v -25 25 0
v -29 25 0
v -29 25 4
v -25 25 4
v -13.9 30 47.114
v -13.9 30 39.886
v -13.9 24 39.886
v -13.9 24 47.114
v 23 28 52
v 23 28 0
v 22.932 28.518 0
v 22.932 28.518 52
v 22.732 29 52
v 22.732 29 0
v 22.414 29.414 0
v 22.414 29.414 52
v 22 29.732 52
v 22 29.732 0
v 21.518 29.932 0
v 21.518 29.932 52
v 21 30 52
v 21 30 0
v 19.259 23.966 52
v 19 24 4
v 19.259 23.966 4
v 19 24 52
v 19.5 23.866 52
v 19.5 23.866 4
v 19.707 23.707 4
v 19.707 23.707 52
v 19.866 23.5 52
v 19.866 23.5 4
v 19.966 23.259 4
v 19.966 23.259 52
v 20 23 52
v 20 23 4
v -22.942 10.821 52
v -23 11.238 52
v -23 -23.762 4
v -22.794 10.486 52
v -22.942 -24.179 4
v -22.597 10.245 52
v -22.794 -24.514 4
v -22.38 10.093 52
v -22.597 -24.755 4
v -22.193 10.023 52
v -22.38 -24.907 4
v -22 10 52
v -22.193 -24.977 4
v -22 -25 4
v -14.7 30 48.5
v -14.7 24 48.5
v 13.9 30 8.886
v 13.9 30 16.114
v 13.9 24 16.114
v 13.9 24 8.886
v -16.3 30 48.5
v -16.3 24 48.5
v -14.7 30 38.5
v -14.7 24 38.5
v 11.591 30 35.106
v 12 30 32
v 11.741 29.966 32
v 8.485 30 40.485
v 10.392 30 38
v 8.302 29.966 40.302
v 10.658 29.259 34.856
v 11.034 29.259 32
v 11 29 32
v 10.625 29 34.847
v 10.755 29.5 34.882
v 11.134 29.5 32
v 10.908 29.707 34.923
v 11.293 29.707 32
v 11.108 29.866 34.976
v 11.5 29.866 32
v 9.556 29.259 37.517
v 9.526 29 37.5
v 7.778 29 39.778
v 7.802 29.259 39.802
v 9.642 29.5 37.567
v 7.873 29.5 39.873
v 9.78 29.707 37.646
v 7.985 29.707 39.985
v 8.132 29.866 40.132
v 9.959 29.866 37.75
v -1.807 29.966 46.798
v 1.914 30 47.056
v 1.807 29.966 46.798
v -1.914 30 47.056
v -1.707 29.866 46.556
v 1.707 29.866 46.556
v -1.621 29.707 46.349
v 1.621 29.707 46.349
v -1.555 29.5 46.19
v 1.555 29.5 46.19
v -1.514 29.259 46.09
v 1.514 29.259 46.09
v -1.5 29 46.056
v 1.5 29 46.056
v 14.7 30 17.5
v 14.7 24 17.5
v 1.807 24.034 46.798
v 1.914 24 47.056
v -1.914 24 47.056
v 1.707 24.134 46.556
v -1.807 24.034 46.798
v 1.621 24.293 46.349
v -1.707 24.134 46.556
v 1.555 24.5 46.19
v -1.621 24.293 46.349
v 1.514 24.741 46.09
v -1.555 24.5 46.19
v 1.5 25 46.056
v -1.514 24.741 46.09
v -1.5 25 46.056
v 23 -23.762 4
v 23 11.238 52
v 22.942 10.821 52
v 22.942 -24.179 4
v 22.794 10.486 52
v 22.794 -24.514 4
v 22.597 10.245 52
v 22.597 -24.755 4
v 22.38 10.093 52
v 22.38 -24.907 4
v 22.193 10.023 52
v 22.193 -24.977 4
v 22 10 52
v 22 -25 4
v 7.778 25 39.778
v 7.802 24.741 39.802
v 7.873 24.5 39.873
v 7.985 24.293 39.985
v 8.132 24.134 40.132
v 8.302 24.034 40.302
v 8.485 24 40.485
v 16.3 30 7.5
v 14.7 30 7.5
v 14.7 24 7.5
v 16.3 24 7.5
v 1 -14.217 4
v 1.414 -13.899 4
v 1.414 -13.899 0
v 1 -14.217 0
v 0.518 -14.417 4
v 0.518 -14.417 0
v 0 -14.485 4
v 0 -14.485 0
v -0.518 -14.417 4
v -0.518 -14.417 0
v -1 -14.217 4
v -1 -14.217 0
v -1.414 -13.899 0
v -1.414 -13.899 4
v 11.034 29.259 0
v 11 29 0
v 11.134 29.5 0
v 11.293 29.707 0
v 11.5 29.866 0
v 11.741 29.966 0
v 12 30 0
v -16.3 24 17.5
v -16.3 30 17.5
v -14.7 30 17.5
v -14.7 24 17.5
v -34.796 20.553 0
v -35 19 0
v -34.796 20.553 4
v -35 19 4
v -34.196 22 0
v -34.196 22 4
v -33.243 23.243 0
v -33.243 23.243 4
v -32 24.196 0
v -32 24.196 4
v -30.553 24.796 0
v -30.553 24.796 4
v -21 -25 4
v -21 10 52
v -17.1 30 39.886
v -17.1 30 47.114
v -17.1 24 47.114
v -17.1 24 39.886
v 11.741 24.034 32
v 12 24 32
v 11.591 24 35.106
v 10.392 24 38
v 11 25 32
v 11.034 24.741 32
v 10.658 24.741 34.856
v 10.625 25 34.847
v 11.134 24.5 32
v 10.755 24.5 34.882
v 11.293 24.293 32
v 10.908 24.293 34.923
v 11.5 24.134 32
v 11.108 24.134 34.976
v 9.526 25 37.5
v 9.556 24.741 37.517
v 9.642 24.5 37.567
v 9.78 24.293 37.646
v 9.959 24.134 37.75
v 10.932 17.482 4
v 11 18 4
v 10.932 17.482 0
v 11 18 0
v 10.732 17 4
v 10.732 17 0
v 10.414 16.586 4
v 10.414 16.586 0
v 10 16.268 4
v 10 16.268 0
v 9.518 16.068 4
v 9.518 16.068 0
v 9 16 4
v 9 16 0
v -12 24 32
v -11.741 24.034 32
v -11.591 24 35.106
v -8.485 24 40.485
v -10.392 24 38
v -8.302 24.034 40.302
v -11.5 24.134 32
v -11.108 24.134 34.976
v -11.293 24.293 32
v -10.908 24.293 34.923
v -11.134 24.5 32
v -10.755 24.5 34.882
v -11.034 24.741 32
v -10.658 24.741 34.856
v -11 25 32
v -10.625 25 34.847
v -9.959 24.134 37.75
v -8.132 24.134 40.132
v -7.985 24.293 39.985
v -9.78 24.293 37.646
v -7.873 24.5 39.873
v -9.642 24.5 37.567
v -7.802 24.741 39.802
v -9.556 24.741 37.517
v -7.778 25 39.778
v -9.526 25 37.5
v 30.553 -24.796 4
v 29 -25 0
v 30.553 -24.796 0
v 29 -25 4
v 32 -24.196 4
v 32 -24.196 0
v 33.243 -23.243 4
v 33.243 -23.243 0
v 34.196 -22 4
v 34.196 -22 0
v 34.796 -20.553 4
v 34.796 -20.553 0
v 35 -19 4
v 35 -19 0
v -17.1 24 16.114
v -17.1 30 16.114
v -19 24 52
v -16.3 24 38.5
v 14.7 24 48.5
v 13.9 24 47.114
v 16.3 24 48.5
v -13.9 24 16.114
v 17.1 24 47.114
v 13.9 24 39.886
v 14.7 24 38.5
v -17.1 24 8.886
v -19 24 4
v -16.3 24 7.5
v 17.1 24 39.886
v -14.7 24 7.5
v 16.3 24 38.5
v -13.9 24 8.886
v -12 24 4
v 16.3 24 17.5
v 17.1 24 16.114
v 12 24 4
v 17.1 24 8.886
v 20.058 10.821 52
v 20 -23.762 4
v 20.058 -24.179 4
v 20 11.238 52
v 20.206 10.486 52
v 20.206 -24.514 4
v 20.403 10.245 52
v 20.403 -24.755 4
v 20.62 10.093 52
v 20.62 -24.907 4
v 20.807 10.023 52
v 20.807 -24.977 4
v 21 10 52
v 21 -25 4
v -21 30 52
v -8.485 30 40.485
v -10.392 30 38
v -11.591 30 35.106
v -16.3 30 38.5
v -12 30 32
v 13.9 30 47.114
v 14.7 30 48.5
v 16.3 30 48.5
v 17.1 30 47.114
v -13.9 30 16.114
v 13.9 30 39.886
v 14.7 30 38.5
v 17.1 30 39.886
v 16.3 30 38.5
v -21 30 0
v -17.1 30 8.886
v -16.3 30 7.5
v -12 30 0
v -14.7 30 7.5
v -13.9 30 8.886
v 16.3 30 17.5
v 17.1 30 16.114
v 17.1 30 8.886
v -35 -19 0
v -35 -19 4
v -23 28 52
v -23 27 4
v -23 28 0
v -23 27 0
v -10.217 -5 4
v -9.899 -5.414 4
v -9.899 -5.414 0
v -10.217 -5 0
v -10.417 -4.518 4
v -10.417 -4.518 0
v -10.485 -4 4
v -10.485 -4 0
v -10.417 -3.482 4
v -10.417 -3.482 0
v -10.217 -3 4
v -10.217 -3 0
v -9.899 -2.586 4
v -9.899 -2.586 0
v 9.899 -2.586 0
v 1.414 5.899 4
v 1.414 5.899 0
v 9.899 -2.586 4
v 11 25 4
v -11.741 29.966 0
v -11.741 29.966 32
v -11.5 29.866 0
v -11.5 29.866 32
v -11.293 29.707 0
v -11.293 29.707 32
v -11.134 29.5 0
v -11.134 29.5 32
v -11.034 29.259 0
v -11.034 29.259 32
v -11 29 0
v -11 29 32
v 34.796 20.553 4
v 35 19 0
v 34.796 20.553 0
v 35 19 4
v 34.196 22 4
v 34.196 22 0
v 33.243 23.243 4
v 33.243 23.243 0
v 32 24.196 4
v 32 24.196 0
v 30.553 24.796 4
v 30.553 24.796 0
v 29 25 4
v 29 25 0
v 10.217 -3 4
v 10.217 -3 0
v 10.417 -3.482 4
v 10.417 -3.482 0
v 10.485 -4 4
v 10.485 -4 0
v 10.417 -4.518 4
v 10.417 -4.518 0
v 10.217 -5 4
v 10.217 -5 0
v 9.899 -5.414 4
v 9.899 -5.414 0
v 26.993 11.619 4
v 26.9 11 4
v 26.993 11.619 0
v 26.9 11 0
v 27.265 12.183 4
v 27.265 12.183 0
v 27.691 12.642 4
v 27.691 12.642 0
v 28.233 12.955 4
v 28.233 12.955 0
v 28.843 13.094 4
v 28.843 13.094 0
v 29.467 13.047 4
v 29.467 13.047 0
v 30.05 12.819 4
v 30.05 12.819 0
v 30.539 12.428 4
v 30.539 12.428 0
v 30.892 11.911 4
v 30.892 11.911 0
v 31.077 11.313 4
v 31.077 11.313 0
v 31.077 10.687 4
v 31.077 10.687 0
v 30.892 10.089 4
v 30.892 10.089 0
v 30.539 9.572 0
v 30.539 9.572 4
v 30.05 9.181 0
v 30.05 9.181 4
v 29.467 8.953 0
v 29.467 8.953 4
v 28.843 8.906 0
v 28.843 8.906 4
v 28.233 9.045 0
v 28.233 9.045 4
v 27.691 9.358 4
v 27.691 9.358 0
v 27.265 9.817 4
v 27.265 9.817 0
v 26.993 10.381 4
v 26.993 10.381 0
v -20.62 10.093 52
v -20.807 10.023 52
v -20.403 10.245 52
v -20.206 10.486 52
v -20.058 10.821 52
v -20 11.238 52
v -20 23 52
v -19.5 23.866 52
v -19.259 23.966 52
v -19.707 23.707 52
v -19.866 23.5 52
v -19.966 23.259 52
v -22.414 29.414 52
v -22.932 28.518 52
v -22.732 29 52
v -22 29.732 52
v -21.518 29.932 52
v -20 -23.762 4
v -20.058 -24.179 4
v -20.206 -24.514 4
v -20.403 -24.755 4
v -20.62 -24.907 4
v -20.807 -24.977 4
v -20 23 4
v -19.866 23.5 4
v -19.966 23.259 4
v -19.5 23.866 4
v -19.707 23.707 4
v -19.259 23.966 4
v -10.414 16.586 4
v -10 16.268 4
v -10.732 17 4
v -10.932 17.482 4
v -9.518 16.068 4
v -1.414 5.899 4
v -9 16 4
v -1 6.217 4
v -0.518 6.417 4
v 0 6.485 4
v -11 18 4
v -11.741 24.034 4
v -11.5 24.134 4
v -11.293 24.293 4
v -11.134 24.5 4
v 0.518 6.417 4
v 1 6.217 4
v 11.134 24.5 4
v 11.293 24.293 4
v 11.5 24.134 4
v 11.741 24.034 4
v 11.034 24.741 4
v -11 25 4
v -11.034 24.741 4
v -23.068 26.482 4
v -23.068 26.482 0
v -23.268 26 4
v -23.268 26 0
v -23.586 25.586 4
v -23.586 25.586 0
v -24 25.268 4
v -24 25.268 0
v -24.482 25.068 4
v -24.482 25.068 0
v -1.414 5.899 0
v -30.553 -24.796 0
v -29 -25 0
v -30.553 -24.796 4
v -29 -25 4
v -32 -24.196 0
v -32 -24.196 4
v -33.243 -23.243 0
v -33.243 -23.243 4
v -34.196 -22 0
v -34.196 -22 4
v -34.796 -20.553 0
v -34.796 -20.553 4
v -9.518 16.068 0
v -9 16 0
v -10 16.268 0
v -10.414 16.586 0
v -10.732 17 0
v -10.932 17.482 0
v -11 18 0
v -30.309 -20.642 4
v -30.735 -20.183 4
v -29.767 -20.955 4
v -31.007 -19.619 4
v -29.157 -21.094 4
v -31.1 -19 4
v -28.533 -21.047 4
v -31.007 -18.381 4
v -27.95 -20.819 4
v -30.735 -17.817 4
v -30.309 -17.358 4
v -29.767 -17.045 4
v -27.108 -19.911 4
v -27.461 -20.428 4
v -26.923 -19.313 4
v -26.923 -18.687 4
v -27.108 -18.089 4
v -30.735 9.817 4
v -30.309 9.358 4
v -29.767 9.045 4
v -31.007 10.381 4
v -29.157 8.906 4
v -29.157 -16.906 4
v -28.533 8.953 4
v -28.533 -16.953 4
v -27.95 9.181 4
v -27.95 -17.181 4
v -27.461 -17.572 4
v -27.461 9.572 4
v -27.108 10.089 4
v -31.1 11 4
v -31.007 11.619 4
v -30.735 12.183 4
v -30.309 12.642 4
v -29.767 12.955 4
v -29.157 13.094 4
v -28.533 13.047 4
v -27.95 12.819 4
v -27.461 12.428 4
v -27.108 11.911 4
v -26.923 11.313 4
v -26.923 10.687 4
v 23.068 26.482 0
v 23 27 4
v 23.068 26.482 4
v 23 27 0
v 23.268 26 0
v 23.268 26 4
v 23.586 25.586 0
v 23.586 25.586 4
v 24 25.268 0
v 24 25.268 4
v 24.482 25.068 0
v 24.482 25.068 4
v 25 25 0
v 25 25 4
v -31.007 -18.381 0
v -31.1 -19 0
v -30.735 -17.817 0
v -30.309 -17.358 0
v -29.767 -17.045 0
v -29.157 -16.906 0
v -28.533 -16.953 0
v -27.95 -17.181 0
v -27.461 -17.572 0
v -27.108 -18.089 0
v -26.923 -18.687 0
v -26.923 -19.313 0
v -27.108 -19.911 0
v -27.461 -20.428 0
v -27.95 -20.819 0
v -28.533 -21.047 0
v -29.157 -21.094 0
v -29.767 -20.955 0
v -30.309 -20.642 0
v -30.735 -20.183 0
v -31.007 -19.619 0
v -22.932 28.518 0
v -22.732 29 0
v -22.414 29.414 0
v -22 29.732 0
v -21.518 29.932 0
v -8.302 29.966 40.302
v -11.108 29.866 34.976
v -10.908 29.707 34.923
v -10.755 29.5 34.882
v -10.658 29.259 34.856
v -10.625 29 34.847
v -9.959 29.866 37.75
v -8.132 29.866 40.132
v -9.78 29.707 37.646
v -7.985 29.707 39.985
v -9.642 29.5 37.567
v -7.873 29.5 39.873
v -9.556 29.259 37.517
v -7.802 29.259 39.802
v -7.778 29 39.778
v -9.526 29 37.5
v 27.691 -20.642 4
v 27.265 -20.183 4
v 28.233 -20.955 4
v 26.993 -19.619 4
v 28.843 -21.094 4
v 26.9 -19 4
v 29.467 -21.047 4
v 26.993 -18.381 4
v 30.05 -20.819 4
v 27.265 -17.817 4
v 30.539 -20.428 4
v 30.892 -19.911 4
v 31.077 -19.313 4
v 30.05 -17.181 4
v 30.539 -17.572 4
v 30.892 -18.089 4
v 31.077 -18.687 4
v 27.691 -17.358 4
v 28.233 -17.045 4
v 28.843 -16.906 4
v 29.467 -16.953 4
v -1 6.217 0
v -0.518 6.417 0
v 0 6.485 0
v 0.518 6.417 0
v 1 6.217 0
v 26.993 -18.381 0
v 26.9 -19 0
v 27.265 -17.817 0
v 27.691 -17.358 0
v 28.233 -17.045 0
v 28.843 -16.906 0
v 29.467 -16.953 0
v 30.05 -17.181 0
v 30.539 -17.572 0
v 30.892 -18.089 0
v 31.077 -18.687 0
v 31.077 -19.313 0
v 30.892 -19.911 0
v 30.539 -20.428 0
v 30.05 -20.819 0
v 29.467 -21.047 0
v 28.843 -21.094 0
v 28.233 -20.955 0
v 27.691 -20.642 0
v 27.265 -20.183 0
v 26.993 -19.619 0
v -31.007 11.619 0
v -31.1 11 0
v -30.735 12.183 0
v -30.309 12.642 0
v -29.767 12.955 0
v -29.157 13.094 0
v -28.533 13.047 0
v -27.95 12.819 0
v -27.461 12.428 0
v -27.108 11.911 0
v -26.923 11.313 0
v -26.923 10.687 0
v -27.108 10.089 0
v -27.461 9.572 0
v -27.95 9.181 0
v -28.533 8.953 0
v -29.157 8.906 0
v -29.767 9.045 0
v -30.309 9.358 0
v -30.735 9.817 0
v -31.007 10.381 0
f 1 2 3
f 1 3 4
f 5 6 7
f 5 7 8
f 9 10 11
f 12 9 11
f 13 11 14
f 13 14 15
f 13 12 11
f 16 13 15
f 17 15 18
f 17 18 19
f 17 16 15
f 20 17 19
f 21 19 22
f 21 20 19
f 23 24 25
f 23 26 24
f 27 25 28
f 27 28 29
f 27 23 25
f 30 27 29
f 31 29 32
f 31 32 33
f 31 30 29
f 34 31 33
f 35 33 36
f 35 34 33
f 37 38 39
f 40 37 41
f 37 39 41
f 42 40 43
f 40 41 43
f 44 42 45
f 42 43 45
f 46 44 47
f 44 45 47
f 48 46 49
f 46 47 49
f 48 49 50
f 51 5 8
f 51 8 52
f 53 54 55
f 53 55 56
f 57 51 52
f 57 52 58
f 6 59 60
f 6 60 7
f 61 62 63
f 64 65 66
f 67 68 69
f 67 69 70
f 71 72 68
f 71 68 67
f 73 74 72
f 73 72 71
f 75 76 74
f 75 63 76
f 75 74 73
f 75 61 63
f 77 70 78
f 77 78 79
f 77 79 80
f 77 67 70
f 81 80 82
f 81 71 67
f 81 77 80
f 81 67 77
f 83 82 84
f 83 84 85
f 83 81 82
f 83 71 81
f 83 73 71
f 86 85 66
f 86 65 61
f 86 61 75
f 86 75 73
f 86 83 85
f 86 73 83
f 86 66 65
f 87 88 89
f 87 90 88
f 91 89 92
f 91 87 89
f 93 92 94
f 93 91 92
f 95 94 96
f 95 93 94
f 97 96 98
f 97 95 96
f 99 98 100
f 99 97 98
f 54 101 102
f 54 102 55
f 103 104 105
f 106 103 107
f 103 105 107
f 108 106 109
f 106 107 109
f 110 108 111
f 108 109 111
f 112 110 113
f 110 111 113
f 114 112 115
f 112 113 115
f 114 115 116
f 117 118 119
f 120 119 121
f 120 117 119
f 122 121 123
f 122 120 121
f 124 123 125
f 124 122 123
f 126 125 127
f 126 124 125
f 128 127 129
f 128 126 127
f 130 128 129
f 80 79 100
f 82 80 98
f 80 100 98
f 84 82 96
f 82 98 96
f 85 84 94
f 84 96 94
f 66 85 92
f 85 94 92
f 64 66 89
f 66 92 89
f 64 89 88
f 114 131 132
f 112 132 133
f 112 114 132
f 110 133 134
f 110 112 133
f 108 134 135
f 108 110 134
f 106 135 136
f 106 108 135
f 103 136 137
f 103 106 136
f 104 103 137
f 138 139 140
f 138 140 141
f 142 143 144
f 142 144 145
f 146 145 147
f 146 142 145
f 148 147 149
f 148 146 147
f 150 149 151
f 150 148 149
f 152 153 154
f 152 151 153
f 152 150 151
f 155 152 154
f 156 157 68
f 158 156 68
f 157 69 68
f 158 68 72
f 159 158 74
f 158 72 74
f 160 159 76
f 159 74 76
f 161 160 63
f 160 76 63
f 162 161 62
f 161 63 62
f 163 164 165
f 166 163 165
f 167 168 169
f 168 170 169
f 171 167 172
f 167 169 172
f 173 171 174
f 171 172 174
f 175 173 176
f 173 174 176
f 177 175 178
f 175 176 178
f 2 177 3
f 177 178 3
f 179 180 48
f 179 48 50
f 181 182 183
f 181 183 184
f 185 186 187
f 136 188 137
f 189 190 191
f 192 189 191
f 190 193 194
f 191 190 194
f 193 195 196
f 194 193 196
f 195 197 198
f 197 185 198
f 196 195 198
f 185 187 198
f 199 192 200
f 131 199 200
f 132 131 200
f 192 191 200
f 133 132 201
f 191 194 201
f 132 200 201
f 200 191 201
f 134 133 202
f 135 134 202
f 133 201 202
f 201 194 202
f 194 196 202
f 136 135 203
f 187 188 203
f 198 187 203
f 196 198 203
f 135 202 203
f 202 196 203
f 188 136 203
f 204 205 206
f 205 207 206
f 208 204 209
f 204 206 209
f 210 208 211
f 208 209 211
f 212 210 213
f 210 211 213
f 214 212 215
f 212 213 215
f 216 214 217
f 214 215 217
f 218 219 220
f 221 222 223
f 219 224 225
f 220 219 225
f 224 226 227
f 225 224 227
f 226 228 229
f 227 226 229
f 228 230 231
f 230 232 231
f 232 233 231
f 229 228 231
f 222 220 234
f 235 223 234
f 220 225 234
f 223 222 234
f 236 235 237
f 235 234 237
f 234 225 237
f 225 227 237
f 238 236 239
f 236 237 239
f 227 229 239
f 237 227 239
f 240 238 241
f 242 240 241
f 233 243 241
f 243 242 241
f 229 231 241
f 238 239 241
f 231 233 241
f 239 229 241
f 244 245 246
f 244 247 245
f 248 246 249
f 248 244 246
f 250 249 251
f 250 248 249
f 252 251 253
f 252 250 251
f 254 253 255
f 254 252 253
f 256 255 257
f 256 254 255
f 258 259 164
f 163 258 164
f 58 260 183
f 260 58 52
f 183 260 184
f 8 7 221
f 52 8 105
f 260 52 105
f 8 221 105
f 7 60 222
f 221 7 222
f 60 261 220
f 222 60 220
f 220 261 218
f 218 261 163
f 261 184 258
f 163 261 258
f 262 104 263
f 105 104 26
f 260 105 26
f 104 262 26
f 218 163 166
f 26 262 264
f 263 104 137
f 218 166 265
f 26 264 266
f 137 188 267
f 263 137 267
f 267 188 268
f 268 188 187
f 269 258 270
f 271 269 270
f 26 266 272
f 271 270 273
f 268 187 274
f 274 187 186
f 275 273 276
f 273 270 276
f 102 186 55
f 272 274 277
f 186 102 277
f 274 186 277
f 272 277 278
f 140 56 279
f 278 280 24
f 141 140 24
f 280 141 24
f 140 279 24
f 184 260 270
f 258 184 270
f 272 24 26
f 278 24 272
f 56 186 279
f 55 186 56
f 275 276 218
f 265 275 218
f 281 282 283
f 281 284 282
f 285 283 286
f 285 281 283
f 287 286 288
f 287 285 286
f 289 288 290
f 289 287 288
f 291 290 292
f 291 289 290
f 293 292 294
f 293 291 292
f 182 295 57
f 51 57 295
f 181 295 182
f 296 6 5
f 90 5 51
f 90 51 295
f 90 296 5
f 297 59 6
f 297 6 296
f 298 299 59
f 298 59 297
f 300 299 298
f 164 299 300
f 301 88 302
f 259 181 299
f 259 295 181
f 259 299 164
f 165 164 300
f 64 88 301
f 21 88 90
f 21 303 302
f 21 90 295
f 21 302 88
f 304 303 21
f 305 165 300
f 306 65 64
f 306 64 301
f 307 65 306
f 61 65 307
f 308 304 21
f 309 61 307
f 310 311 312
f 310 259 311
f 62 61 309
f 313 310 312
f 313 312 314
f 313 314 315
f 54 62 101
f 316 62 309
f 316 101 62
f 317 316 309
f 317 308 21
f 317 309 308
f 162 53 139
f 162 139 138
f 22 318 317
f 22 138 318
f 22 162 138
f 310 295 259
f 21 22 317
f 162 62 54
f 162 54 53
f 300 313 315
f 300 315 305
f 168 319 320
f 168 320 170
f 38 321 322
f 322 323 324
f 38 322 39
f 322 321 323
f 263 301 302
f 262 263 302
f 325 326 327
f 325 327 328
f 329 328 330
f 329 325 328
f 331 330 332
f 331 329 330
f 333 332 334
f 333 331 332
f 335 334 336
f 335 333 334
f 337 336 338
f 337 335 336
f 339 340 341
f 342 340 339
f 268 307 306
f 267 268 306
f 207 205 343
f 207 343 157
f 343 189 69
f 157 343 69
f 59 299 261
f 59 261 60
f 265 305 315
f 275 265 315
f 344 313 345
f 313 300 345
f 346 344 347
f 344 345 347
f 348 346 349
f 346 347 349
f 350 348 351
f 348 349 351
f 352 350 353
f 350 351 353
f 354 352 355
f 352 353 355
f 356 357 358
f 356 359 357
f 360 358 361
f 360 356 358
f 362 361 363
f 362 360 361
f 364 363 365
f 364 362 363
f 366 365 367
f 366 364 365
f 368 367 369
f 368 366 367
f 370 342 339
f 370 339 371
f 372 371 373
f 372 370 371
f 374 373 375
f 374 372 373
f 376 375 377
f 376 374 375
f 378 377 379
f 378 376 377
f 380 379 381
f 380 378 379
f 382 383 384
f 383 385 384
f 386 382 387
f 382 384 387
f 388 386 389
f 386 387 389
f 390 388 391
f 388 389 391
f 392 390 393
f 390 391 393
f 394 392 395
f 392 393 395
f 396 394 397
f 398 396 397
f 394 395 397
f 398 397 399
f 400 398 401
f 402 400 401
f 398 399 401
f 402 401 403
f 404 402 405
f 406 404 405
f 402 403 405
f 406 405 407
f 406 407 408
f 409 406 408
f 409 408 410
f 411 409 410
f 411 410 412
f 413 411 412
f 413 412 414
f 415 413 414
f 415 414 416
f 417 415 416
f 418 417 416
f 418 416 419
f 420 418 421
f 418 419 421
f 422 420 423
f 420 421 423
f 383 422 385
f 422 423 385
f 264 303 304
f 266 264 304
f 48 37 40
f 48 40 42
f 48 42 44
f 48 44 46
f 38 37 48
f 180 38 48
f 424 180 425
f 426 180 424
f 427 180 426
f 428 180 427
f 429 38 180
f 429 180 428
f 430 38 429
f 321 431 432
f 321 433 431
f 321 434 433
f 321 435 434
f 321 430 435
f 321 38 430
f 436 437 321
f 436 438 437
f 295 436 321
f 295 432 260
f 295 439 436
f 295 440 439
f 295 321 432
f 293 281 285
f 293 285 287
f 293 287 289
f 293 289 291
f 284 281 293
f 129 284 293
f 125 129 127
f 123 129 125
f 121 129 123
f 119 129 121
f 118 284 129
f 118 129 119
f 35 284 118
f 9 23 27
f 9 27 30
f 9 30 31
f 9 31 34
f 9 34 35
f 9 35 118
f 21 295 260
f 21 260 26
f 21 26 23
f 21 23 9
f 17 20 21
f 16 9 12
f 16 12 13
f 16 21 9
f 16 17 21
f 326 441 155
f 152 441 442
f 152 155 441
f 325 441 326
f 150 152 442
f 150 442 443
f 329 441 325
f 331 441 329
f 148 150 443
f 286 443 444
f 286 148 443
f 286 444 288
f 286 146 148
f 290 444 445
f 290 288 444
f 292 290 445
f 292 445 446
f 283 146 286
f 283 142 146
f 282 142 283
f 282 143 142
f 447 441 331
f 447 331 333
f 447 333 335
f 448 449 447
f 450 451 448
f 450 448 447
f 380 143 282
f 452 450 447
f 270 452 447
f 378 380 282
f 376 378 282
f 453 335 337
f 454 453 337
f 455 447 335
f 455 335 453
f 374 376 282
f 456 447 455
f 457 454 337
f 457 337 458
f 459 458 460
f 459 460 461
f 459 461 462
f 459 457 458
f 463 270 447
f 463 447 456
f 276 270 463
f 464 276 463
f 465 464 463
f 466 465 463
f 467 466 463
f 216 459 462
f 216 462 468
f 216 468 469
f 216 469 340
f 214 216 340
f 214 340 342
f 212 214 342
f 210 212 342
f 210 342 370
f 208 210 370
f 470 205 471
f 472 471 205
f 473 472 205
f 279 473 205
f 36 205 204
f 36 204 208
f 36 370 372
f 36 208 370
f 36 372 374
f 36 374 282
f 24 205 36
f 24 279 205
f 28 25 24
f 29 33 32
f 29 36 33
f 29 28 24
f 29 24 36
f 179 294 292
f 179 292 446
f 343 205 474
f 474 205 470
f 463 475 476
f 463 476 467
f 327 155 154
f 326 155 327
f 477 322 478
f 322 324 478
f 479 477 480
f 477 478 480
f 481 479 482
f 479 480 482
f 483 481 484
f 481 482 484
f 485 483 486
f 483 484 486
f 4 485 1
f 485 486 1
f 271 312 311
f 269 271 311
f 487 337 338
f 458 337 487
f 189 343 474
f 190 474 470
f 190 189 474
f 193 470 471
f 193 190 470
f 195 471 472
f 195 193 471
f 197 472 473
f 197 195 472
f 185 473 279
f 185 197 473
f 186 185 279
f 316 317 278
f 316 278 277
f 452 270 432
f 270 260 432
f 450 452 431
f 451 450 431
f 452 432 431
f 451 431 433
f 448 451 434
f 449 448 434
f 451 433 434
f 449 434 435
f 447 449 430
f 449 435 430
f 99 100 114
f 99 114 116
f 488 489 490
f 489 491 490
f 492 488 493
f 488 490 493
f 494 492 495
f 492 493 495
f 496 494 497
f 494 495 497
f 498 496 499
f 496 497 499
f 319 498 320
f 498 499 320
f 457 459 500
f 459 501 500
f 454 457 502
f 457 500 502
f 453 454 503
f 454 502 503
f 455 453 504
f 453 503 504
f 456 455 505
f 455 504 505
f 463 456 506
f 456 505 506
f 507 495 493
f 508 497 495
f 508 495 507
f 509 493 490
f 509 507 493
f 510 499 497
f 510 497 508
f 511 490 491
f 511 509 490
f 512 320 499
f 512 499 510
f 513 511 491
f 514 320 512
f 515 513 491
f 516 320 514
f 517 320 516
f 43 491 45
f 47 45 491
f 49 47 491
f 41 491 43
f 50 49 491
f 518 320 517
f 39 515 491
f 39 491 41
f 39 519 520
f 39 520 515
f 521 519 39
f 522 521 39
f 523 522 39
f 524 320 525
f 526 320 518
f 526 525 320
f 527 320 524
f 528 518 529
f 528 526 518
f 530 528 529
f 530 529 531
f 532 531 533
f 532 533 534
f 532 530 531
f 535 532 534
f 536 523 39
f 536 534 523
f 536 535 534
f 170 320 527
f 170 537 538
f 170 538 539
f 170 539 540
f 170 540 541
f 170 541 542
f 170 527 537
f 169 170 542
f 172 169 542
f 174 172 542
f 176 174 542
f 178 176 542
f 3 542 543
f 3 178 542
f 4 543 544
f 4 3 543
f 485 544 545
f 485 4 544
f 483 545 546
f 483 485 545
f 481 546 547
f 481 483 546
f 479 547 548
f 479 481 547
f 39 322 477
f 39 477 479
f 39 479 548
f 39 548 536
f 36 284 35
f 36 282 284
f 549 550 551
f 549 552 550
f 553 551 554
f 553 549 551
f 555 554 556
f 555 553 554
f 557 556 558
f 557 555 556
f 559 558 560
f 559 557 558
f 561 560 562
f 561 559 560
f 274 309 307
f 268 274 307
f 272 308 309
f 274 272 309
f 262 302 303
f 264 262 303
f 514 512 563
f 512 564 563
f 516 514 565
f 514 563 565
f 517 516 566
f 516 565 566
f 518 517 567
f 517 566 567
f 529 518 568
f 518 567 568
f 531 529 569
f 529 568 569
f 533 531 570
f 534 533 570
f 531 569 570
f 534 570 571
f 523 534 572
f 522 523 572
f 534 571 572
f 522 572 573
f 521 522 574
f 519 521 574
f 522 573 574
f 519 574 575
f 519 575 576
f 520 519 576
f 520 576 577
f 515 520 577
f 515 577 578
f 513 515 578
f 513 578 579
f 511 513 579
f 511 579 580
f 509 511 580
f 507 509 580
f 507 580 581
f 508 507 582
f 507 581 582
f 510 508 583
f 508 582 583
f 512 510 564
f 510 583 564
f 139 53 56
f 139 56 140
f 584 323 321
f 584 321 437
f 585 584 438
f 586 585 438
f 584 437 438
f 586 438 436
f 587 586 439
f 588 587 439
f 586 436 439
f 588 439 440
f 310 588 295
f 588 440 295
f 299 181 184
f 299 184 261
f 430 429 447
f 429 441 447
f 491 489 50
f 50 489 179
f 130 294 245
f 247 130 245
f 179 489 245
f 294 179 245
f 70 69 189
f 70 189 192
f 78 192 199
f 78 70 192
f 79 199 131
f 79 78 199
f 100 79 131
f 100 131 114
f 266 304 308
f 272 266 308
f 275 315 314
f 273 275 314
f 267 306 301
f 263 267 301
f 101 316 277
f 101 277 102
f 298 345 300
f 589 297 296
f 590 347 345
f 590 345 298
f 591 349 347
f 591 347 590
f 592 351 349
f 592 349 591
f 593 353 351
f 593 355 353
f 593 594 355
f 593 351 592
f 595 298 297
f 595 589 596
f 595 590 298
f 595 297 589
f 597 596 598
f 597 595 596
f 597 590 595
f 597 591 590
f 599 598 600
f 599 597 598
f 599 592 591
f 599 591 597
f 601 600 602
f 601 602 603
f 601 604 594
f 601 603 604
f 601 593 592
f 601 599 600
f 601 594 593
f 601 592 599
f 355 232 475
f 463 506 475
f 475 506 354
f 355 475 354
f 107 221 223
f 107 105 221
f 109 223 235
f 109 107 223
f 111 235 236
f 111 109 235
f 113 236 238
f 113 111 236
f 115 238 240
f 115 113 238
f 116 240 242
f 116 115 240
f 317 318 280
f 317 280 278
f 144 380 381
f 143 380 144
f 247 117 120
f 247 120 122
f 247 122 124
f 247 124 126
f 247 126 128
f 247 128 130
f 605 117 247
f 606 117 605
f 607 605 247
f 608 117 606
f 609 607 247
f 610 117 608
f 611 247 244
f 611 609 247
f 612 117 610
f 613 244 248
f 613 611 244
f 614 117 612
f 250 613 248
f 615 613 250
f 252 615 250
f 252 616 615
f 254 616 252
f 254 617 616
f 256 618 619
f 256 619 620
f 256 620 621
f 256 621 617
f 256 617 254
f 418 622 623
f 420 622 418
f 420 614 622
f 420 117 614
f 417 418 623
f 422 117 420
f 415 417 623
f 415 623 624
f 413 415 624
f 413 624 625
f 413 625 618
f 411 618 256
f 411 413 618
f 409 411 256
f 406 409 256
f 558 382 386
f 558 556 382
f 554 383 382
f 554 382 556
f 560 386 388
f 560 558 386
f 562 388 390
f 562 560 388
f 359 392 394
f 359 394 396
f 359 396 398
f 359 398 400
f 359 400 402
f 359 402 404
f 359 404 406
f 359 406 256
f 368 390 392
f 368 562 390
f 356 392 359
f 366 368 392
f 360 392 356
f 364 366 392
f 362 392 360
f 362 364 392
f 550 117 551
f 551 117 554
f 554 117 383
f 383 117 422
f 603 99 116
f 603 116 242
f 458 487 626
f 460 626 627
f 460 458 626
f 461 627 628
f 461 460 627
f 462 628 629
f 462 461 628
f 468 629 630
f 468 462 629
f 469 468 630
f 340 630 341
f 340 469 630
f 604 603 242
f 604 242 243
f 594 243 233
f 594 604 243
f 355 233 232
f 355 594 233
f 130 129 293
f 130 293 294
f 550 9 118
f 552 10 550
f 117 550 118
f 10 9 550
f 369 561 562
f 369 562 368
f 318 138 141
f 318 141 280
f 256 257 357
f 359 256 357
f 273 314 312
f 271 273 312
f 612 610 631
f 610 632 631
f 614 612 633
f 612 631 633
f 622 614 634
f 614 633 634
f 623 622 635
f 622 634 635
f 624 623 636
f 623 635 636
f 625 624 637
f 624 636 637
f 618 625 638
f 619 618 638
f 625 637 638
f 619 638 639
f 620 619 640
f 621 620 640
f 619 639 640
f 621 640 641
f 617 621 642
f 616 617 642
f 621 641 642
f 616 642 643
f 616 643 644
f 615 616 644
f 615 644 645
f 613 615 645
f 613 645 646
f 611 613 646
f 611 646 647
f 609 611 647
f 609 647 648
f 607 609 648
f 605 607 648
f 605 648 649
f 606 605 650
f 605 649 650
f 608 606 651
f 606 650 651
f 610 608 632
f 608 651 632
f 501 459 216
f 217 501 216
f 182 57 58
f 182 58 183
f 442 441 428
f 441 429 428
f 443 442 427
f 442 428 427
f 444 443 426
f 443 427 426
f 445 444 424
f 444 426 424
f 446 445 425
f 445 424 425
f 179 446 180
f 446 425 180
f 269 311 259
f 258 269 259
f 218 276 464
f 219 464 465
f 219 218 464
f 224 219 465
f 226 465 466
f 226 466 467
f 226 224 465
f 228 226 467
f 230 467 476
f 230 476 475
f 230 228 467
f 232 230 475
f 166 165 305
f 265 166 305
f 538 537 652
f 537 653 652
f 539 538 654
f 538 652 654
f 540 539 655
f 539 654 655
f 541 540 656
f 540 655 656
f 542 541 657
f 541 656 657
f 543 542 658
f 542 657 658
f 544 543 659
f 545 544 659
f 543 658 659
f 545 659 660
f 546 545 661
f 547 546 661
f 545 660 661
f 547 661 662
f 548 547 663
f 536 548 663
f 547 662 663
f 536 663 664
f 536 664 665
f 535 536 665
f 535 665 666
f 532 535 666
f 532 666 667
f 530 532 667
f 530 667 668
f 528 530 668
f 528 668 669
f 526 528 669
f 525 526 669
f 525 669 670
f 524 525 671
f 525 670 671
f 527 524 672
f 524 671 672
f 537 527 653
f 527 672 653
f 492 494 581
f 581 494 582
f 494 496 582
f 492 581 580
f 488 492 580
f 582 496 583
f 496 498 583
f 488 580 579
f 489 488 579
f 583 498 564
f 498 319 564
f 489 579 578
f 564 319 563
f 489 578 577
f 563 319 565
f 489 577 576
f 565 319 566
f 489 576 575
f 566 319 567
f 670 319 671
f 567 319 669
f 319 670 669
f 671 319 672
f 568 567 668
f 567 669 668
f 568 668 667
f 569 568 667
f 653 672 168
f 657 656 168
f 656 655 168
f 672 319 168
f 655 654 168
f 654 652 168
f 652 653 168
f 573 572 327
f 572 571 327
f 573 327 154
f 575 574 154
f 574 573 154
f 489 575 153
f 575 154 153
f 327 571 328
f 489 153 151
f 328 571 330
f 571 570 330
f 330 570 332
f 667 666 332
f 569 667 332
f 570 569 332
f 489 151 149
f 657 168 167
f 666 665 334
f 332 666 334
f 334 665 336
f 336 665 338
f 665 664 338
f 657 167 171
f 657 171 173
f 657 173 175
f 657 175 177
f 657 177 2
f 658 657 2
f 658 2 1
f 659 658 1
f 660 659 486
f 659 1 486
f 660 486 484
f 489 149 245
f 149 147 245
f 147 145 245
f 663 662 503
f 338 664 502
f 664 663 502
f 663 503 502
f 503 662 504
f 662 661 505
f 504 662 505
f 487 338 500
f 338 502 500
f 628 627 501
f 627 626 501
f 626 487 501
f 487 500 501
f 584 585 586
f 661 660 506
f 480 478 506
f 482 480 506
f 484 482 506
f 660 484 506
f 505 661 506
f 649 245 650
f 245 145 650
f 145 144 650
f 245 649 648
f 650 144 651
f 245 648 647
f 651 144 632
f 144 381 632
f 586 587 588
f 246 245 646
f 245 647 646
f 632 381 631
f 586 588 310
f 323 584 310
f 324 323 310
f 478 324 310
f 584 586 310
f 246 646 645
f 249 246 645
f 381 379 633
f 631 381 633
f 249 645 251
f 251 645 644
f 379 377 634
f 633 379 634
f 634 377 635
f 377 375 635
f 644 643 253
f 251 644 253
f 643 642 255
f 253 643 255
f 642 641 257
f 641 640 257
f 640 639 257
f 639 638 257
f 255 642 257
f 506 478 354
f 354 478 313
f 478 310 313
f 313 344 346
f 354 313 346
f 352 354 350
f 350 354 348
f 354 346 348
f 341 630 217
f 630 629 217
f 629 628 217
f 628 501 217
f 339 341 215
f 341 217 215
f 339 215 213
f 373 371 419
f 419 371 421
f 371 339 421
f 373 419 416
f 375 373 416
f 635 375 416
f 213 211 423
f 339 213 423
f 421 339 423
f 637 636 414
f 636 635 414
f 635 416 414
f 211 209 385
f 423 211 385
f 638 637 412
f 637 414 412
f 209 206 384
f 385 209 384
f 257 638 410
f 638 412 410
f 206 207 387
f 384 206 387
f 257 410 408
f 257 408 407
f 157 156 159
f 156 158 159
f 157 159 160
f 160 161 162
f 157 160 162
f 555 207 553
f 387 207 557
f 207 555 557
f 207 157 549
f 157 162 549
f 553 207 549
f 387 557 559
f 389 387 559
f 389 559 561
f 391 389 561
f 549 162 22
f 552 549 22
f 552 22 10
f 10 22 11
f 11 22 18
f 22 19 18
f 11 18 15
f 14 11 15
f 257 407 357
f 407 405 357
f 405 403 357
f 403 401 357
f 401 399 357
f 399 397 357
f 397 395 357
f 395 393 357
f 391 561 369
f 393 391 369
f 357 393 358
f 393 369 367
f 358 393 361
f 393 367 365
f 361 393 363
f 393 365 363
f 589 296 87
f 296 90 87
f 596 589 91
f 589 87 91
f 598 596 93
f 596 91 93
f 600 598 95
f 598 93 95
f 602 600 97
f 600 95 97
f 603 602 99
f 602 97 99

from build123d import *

# Parameters (mm, degrees)
SKETCH1_W                      = 70
SKETCH1_H                      = 50
BOSS_EXTRUDE1_DEPTH            = 4
BOSS_EXTRUDE2_DEPTH            = 52
CUT_EXTRUDE3_DEPTH             = 70.491006612
CUT_EXTRUDE3_DEPTH_BACK        = 70.491006612
FILLET1_R                      = 6
CUT_EXTRUDE6_DEPTH             = 84.390646958
SKETCH7_W                      = 22
SKETCH7_H                      = 9
CUT_EXTRUDE7_DEPTH             = 67.550732528
F_4_2_4_2_DIAMETER_HOLE1_D     = 4.2
F_4_2_4_2_DIAMETER_HOLE1_DEPTH = 4
F_4_2_4_2_DIAMETER_HOLE1_TIP   = 1.2618073
CUT_EXTRUDE8_REACH             = 68.551
BOSS_EXTRUDE3_DEPTH            = 6
FILLET2_R                      = 2
FILLET3_R                      = 1
FILLET4_R                      = 1


with BuildPart() as part:
    # Sketch1 → Boss-Extrude1 (new body)
    with BuildSketch(Plane.XY):
        Rectangle(SKETCH1_W, SKETCH1_H)
    extrude(amount=BOSS_EXTRUDE1_DEPTH)

    # Sketch2 → Boss-Extrude2 (add)
    with BuildSketch(Plane.XY):
        Polygon((-23, -25), (-20, -25), (-20, 24), (-11, 24), (-11, 30), (-23, 30), align=None)
        Polygon((11, 24), (11, 30), (23, 30), (23, -25), (20, -25), (20, 24), align=None)
    extrude(amount=BOSS_EXTRUDE2_DEPTH)

    # Sketch3 → Cut-Extrude3 (cut, two sides: drawn at the far end of the back side and taken through both)
    with BuildSketch(Plane.ZY.offset(-CUT_EXTRUDE3_DEPTH_BACK)):
        Polygon((178.049174714, 101.910856562), (52, 10), (4, -25), (-122.049174714, -116.910856562), (61.77253841, -369.00920599), (361.870887838, -150.187492865), align=None)
    extrude(amount=CUT_EXTRUDE3_DEPTH + CUT_EXTRUDE3_DEPTH_BACK, mode=Mode.SUBTRACT)

    # Fillet1
    fillet1_edges = [part.edges().sort_by_distance(p)[0] for p in [
        (35, -25, 2),
        (-35, -25, 2),
        (-35, 25, 2),
        (35, 25, 2),
    ]]
    fillet(fillet1_edges, radius=FILLET1_R)

    # Sketch6 → Cut-Extrude6 (cut, through all)
    with BuildSketch(Plane(origin=(0, 30, 0), x_dir=(1, 0, 0), z_dir=(0, 1, 0))):
        Polygon((-17.1, -47.114359354), (-17.1, -39.885640646), (-16.3, -38.5), (-14.7, -38.5), (-13.9, -39.885640646), (-13.9, -47.114359354), (-14.7, -48.5), (-16.3, -48.5), align=None)
        Polygon((16.3, -48.5), (17.1, -47.114359354), (17.1, -39.885640646), (16.3, -38.5), (14.7, -38.5), (13.9, -39.885640646), (13.9, -47.114359354), (14.7, -48.5), align=None)
        Polygon((17.1, -8.885640646), (17.1, -16.114359354), (16.3, -17.5), (14.7, -17.5), (13.9, -16.114359354), (13.9, -8.885640646), (14.7, -7.5), (16.3, -7.5), align=None)
        Polygon((-16.3, -7.5), (-17.1, -8.885640646), (-17.1, -16.114359354), (-16.3, -17.5), (-14.7, -17.5), (-13.9, -16.114359354), (-13.9, -8.885640646), (-14.7, -7.5), align=None)
    extrude(amount=-CUT_EXTRUDE6_DEPTH, mode=Mode.SUBTRACT)

    # Sketch7 → Cut-Extrude7 (cut, through all)
    with BuildSketch(Plane.XY.offset(4)):
        with Locations((0, 20.5)):
            Rectangle(SKETCH7_W, SKETCH7_H)
    extrude(amount=-CUT_EXTRUDE7_DEPTH, mode=Mode.SUBTRACT)

    # Ø4.2 (4.2) Diameter Hole1
    with Locations(Plane.XY.offset(4)):
        with Locations((-29, -19), (-29, 11), (29, -19), (29, 11)):
            Hole(F_4_2_4_2_DIAMETER_HOLE1_D / 2, depth=F_4_2_4_2_DIAMETER_HOLE1_DEPTH)
            with Locations((0, 0, -(F_4_2_4_2_DIAMETER_HOLE1_DEPTH + F_4_2_4_2_DIAMETER_HOLE1_TIP / 2))):  # 118° drill point
                Cone(0, F_4_2_4_2_DIAMETER_HOLE1_D / 2, F_4_2_4_2_DIAMETER_HOLE1_TIP, mode=Mode.SUBTRACT)

    # Sketch10 → Cut-Extrude8 (cut, up to next)
    with BuildSketch(Plane.XY.offset(4), mode=Mode.PRIVATE) as cut_extrude8_sk1:
        with BuildLine():
            Line((1.414213562, 5.899494937), (9.899494937, -2.585786438))
            ThreePointArc((9.899494937, -2.585786438), (10.485281374, -4), (9.899494937, -5.414213562))
            Line((9.899494937, -5.414213562), (1.414213562, -13.899494937))
            ThreePointArc((1.414213562, -13.899494937), (0, -14.485281374), (-1.414213562, -13.899494937))
            Line((-1.414213562, -13.899494937), (-9.899494937, -5.414213562))
            ThreePointArc((-9.899494937, -5.414213562), (-10.485281374, -4), (-9.899494937, -2.585786438))
            Line((-9.899494937, -2.585786438), (-1.414213562, 5.899494937))
            ThreePointArc((-1.414213562, 5.899494937), (0, 6.485281374), (1.414213562, 5.899494937))
        make_face()
    cut_extrude8_tool1 = extrude(cut_extrude8_sk1.sketch, amount=-CUT_EXTRUDE8_REACH, mode=Mode.PRIVATE) & part.part
    add(cut_extrude8_tool1.solids().sort_by_distance((0, -4, 4))[0], mode=Mode.SUBTRACT)

    # Sketch11 → Boss-Extrude3 (add)
    with BuildSketch(Plane(origin=(0, 30, 0), x_dir=(1, 0, 0), z_dir=(0, 1, 0))):
        with BuildLine():
            Line((-1.5, -46.056349186), (-7.778174593, -39.778174593))
            ThreePointArc((-7.778174593, -39.778174593), (-10.162674858, -36.209517756), (-11, -32))
            Line((-11, -32), (-11, -52))
            Line((-11, -52), (11, -52))
            Line((11, -52), (11, -32))
            ThreePointArc((11, -32), (10.162674858, -36.209517756), (7.778174593, -39.778174593))
            Line((7.778174593, -39.778174593), (1.5, -46.056349186))
            Line((1.5, -46.056349186), (-1.5, -46.056349186))
        make_face()
    extrude(amount=-BOSS_EXTRUDE3_DEPTH)

    # Fillet2
    fillet2_edges = [part.edges().sort_by_distance(p)[0] for p in [
        (-23, 25, 2),
        (-23, 30, 26),
        (-11, 16, 2),
        (11, 16, 2),
        (23, 25, 2),
        (23, 30, 26),
    ]]
    fillet(fillet2_edges, radius=FILLET2_R)

    # Fillet3
    fillet3_edges = [part.edges().sort_by_distance(p)[0] for p in [
        (11, 30, 16),
        (-11, 30, 16),
        (-10.162674858, 30, 36.209517756),
        (10.162674858, 30, 36.209517756),
        (4.639087297, 30, 42.91726189),
        (0, 30, 46.056349186),
        (-4.639087297, 30, 42.91726189),
    ]]
    fillet(fillet3_edges, radius=FILLET3_R)

    # Fillet4
    fillet4_edges = [part.edges().sort_by_distance(p)[0] for p in [
        (-20, 24, 28),
        (11, 24, 18),
        (-11, 24, 18),
        (-10.162674858, 24, 36.209517756),
        (-4.639087297, 24, 42.91726189),
        (0, 24, 46.056349186),
        (4.639087297, 24, 42.91726189),
        (10.162674858, 24, 36.209517756),
        (20, 24, 28),
        (-23, -7.5, 28),
        (-20, -7.5, 28),
        (20, -7.5, 28),
        (23, -7.5, 28),
    ]]
    fillet(fillet4_edges, radius=FILLET4_R)


solid = part.part
